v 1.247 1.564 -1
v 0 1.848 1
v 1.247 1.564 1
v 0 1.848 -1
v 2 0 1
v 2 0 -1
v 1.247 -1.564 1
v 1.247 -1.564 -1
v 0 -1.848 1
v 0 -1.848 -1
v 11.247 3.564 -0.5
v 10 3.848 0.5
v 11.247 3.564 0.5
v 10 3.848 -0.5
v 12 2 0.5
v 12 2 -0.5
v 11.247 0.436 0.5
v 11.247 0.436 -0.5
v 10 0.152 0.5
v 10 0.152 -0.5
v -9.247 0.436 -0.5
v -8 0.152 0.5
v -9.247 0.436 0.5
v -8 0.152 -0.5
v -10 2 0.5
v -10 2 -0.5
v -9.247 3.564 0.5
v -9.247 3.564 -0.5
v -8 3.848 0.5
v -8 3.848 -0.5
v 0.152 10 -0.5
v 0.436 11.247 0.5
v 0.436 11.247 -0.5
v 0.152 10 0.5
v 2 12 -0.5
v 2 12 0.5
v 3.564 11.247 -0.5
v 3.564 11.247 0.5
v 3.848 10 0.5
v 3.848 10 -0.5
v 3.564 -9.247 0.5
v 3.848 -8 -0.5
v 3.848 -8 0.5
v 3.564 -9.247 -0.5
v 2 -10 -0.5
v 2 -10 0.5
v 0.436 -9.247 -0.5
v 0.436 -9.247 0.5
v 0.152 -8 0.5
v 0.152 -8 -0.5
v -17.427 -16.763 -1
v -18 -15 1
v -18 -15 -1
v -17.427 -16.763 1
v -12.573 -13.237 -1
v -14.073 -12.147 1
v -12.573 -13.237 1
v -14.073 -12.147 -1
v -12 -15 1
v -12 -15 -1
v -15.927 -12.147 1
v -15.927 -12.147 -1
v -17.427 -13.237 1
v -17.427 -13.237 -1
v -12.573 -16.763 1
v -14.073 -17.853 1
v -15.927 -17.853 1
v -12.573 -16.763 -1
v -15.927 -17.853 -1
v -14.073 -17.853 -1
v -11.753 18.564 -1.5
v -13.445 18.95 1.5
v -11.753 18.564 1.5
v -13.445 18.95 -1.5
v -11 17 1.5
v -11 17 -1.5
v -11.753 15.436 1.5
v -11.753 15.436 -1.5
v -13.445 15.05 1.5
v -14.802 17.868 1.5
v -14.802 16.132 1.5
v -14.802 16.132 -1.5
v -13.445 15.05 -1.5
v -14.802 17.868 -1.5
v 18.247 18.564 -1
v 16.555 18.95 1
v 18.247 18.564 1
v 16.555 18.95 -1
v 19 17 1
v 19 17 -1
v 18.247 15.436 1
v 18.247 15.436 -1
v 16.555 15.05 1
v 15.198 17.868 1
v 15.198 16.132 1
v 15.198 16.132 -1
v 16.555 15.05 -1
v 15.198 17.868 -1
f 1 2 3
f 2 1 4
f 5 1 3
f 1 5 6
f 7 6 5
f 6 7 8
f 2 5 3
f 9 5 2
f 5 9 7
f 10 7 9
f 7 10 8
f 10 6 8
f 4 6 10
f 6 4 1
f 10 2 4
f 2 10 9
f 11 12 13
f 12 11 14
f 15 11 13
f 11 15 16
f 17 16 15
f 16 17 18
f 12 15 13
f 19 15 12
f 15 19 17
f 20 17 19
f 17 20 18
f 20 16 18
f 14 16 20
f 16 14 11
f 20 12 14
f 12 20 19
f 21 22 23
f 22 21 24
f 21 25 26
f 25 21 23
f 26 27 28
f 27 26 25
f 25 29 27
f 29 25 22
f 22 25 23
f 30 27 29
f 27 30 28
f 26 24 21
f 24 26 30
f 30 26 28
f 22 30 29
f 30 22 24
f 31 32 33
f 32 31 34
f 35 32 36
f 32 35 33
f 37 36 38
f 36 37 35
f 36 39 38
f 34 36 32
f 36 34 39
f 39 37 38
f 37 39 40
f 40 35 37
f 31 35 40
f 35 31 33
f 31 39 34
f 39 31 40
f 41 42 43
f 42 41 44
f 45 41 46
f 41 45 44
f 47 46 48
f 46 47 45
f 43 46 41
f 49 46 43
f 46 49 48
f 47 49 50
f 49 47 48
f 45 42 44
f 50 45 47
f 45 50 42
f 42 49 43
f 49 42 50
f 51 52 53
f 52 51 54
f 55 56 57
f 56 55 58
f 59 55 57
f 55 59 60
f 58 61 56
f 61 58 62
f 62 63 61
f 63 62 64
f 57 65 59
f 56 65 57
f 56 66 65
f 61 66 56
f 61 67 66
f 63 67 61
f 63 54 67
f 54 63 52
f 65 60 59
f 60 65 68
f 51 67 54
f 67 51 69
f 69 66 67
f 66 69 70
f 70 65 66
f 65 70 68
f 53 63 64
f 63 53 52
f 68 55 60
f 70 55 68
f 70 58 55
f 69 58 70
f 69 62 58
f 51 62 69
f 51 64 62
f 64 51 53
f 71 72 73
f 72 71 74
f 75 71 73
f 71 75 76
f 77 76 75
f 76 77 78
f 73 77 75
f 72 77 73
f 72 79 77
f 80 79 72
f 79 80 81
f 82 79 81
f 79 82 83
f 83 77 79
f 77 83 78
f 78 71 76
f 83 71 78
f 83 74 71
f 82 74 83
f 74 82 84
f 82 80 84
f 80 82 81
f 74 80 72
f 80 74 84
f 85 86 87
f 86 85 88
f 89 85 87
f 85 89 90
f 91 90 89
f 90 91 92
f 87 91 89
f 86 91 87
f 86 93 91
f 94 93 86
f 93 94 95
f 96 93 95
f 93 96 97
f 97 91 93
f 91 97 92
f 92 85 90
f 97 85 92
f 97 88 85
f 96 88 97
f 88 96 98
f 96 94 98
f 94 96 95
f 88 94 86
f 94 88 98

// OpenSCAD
// file: myCube.scad
// Copyright Stephen Morrisson 2017
// All rights reserved

// {xyz, rot, trans, tr} Cube

module xyzCube(c, x, y, z)
{
    color(c) cube([x, y, z], false);
}

module rotCube(c, rotX, rotY, rotZ, x, y, z)
{
    rotate([rotX, rotY, rotZ]) xyzCube(c, x, y, z);
}
translate([-15, 15, 0,])rotCube("green", 45, 45, 45, 2,2,2);

module transCube(c, xOffset, yOffset, zOffset, x, y, z)
{
    translate([xOffset, yOffset, zOffset]) xyzCube(c, x, y, z);
}
transCube("brown", -15, -15, 0, 3, 2, 1);


module trCube(c, rotX, rotY, rotZ, xO, yO, zO, x, y, z)
{
    translate([xO, yO, zO])
    rotate([rotX, rotY, rotZ])
    xyzCube(c, x, y, z);
}
//trCube("yellow", 0,0,0, 0,0,0, 2, 3, 4);
//trCube("green", 45, 45, 45, 4, 3, 1, 5, 6, 7);
//trCube("blue", 0, 0, 45, 20, 0, 0, 5, 6, 7);
trCube("orange", 0,0,0, -10, 0, 0, 1,1,1);
//trCube("orange", 45,0,0, -15, 0, 0, 1,1,1);
//trCube("orange", 0,45,0, -20, 0, 0, 1,1,1);
//trCube("orange", 0,0,45, -25, 0, 0, 1,1,1);
// main file
// Copyright Stephen Morrisson 2017
// All rights reserved

// rh Cent Cylinder
// rh Cylinder
use <myCube.scad>

module rhCentCylinder(c, rRadius, z)
{
    color(c) cylinder(h=z, r=rRadius, center=true);
}
translate([-15, -15, 0]) rhCentCylinder("red", 3, 2);

module rhCylinder(c, rRadius, z)
{
    translate([rRadius, rRadius, 0]) rhCentCylinder(c, rRadius, z);
}
translate([-15, 15, 0]) rhCylinder("blue", 2, 3);

module transCylinder(c, xO, yO, zO, rRadius, z)
{
    translate([xO, yO, zO]) rhCylinder(c, rRadius, z);
}
//transCylinder("red", 0,0,0, 4, 1);
transCylinder("green", 15, 15, 0, 2, 2);

module centRightCylinder(c, rRadius, z)
{
    rD = rRadius * 3.0;
    difference()
    {
        rhCentCylinder(c, rRadius, z);
        transCube(c, -rD, -rRadius, -rRadius,  rD, rD, rD);
    }
}
centRightCylinder("green", 2, 2);

module rightHalfCylinder(c, xO, yO, zO, rRadius, z)
{
    translate([xO, yO + rRadius, zO]) centRightCylinder(c, rRadius, z);
}
rightHalfCylinder("yellow", 10, 0, 0, 2, 1);

module leftHalfCylinder(c, xO, yO, zO, rRadius, z)
{
    translate([xO + rRadius, yO + rRadius, zO])
        rotate([0,0,180]) centRightCylinder(c, rRadius, z);
}
leftHalfCylinder("yellow", -10, 0, 0, 2, 1);

module topHalfCylinder(c, xO, yO, zO, rRadius, z)
{
    translate([xO + rRadius, yO, zO])
        rotate([0,0,90]) centRightCylinder(c, rRadius, z);
}
topHalfCylinder("yellow", 0, 10, 0, 2, 1);

module bottomHalfCylinder(c, xO, yO, zO, rRadius, z)
{
    translate([xO + rRadius, yO + rRadius, zO])
        rotate([0,0,270]) centRightCylinder(c, rRadius, z);
}
bottomHalfCylinder("yellow", 0, -10, 0, 2, 1);
